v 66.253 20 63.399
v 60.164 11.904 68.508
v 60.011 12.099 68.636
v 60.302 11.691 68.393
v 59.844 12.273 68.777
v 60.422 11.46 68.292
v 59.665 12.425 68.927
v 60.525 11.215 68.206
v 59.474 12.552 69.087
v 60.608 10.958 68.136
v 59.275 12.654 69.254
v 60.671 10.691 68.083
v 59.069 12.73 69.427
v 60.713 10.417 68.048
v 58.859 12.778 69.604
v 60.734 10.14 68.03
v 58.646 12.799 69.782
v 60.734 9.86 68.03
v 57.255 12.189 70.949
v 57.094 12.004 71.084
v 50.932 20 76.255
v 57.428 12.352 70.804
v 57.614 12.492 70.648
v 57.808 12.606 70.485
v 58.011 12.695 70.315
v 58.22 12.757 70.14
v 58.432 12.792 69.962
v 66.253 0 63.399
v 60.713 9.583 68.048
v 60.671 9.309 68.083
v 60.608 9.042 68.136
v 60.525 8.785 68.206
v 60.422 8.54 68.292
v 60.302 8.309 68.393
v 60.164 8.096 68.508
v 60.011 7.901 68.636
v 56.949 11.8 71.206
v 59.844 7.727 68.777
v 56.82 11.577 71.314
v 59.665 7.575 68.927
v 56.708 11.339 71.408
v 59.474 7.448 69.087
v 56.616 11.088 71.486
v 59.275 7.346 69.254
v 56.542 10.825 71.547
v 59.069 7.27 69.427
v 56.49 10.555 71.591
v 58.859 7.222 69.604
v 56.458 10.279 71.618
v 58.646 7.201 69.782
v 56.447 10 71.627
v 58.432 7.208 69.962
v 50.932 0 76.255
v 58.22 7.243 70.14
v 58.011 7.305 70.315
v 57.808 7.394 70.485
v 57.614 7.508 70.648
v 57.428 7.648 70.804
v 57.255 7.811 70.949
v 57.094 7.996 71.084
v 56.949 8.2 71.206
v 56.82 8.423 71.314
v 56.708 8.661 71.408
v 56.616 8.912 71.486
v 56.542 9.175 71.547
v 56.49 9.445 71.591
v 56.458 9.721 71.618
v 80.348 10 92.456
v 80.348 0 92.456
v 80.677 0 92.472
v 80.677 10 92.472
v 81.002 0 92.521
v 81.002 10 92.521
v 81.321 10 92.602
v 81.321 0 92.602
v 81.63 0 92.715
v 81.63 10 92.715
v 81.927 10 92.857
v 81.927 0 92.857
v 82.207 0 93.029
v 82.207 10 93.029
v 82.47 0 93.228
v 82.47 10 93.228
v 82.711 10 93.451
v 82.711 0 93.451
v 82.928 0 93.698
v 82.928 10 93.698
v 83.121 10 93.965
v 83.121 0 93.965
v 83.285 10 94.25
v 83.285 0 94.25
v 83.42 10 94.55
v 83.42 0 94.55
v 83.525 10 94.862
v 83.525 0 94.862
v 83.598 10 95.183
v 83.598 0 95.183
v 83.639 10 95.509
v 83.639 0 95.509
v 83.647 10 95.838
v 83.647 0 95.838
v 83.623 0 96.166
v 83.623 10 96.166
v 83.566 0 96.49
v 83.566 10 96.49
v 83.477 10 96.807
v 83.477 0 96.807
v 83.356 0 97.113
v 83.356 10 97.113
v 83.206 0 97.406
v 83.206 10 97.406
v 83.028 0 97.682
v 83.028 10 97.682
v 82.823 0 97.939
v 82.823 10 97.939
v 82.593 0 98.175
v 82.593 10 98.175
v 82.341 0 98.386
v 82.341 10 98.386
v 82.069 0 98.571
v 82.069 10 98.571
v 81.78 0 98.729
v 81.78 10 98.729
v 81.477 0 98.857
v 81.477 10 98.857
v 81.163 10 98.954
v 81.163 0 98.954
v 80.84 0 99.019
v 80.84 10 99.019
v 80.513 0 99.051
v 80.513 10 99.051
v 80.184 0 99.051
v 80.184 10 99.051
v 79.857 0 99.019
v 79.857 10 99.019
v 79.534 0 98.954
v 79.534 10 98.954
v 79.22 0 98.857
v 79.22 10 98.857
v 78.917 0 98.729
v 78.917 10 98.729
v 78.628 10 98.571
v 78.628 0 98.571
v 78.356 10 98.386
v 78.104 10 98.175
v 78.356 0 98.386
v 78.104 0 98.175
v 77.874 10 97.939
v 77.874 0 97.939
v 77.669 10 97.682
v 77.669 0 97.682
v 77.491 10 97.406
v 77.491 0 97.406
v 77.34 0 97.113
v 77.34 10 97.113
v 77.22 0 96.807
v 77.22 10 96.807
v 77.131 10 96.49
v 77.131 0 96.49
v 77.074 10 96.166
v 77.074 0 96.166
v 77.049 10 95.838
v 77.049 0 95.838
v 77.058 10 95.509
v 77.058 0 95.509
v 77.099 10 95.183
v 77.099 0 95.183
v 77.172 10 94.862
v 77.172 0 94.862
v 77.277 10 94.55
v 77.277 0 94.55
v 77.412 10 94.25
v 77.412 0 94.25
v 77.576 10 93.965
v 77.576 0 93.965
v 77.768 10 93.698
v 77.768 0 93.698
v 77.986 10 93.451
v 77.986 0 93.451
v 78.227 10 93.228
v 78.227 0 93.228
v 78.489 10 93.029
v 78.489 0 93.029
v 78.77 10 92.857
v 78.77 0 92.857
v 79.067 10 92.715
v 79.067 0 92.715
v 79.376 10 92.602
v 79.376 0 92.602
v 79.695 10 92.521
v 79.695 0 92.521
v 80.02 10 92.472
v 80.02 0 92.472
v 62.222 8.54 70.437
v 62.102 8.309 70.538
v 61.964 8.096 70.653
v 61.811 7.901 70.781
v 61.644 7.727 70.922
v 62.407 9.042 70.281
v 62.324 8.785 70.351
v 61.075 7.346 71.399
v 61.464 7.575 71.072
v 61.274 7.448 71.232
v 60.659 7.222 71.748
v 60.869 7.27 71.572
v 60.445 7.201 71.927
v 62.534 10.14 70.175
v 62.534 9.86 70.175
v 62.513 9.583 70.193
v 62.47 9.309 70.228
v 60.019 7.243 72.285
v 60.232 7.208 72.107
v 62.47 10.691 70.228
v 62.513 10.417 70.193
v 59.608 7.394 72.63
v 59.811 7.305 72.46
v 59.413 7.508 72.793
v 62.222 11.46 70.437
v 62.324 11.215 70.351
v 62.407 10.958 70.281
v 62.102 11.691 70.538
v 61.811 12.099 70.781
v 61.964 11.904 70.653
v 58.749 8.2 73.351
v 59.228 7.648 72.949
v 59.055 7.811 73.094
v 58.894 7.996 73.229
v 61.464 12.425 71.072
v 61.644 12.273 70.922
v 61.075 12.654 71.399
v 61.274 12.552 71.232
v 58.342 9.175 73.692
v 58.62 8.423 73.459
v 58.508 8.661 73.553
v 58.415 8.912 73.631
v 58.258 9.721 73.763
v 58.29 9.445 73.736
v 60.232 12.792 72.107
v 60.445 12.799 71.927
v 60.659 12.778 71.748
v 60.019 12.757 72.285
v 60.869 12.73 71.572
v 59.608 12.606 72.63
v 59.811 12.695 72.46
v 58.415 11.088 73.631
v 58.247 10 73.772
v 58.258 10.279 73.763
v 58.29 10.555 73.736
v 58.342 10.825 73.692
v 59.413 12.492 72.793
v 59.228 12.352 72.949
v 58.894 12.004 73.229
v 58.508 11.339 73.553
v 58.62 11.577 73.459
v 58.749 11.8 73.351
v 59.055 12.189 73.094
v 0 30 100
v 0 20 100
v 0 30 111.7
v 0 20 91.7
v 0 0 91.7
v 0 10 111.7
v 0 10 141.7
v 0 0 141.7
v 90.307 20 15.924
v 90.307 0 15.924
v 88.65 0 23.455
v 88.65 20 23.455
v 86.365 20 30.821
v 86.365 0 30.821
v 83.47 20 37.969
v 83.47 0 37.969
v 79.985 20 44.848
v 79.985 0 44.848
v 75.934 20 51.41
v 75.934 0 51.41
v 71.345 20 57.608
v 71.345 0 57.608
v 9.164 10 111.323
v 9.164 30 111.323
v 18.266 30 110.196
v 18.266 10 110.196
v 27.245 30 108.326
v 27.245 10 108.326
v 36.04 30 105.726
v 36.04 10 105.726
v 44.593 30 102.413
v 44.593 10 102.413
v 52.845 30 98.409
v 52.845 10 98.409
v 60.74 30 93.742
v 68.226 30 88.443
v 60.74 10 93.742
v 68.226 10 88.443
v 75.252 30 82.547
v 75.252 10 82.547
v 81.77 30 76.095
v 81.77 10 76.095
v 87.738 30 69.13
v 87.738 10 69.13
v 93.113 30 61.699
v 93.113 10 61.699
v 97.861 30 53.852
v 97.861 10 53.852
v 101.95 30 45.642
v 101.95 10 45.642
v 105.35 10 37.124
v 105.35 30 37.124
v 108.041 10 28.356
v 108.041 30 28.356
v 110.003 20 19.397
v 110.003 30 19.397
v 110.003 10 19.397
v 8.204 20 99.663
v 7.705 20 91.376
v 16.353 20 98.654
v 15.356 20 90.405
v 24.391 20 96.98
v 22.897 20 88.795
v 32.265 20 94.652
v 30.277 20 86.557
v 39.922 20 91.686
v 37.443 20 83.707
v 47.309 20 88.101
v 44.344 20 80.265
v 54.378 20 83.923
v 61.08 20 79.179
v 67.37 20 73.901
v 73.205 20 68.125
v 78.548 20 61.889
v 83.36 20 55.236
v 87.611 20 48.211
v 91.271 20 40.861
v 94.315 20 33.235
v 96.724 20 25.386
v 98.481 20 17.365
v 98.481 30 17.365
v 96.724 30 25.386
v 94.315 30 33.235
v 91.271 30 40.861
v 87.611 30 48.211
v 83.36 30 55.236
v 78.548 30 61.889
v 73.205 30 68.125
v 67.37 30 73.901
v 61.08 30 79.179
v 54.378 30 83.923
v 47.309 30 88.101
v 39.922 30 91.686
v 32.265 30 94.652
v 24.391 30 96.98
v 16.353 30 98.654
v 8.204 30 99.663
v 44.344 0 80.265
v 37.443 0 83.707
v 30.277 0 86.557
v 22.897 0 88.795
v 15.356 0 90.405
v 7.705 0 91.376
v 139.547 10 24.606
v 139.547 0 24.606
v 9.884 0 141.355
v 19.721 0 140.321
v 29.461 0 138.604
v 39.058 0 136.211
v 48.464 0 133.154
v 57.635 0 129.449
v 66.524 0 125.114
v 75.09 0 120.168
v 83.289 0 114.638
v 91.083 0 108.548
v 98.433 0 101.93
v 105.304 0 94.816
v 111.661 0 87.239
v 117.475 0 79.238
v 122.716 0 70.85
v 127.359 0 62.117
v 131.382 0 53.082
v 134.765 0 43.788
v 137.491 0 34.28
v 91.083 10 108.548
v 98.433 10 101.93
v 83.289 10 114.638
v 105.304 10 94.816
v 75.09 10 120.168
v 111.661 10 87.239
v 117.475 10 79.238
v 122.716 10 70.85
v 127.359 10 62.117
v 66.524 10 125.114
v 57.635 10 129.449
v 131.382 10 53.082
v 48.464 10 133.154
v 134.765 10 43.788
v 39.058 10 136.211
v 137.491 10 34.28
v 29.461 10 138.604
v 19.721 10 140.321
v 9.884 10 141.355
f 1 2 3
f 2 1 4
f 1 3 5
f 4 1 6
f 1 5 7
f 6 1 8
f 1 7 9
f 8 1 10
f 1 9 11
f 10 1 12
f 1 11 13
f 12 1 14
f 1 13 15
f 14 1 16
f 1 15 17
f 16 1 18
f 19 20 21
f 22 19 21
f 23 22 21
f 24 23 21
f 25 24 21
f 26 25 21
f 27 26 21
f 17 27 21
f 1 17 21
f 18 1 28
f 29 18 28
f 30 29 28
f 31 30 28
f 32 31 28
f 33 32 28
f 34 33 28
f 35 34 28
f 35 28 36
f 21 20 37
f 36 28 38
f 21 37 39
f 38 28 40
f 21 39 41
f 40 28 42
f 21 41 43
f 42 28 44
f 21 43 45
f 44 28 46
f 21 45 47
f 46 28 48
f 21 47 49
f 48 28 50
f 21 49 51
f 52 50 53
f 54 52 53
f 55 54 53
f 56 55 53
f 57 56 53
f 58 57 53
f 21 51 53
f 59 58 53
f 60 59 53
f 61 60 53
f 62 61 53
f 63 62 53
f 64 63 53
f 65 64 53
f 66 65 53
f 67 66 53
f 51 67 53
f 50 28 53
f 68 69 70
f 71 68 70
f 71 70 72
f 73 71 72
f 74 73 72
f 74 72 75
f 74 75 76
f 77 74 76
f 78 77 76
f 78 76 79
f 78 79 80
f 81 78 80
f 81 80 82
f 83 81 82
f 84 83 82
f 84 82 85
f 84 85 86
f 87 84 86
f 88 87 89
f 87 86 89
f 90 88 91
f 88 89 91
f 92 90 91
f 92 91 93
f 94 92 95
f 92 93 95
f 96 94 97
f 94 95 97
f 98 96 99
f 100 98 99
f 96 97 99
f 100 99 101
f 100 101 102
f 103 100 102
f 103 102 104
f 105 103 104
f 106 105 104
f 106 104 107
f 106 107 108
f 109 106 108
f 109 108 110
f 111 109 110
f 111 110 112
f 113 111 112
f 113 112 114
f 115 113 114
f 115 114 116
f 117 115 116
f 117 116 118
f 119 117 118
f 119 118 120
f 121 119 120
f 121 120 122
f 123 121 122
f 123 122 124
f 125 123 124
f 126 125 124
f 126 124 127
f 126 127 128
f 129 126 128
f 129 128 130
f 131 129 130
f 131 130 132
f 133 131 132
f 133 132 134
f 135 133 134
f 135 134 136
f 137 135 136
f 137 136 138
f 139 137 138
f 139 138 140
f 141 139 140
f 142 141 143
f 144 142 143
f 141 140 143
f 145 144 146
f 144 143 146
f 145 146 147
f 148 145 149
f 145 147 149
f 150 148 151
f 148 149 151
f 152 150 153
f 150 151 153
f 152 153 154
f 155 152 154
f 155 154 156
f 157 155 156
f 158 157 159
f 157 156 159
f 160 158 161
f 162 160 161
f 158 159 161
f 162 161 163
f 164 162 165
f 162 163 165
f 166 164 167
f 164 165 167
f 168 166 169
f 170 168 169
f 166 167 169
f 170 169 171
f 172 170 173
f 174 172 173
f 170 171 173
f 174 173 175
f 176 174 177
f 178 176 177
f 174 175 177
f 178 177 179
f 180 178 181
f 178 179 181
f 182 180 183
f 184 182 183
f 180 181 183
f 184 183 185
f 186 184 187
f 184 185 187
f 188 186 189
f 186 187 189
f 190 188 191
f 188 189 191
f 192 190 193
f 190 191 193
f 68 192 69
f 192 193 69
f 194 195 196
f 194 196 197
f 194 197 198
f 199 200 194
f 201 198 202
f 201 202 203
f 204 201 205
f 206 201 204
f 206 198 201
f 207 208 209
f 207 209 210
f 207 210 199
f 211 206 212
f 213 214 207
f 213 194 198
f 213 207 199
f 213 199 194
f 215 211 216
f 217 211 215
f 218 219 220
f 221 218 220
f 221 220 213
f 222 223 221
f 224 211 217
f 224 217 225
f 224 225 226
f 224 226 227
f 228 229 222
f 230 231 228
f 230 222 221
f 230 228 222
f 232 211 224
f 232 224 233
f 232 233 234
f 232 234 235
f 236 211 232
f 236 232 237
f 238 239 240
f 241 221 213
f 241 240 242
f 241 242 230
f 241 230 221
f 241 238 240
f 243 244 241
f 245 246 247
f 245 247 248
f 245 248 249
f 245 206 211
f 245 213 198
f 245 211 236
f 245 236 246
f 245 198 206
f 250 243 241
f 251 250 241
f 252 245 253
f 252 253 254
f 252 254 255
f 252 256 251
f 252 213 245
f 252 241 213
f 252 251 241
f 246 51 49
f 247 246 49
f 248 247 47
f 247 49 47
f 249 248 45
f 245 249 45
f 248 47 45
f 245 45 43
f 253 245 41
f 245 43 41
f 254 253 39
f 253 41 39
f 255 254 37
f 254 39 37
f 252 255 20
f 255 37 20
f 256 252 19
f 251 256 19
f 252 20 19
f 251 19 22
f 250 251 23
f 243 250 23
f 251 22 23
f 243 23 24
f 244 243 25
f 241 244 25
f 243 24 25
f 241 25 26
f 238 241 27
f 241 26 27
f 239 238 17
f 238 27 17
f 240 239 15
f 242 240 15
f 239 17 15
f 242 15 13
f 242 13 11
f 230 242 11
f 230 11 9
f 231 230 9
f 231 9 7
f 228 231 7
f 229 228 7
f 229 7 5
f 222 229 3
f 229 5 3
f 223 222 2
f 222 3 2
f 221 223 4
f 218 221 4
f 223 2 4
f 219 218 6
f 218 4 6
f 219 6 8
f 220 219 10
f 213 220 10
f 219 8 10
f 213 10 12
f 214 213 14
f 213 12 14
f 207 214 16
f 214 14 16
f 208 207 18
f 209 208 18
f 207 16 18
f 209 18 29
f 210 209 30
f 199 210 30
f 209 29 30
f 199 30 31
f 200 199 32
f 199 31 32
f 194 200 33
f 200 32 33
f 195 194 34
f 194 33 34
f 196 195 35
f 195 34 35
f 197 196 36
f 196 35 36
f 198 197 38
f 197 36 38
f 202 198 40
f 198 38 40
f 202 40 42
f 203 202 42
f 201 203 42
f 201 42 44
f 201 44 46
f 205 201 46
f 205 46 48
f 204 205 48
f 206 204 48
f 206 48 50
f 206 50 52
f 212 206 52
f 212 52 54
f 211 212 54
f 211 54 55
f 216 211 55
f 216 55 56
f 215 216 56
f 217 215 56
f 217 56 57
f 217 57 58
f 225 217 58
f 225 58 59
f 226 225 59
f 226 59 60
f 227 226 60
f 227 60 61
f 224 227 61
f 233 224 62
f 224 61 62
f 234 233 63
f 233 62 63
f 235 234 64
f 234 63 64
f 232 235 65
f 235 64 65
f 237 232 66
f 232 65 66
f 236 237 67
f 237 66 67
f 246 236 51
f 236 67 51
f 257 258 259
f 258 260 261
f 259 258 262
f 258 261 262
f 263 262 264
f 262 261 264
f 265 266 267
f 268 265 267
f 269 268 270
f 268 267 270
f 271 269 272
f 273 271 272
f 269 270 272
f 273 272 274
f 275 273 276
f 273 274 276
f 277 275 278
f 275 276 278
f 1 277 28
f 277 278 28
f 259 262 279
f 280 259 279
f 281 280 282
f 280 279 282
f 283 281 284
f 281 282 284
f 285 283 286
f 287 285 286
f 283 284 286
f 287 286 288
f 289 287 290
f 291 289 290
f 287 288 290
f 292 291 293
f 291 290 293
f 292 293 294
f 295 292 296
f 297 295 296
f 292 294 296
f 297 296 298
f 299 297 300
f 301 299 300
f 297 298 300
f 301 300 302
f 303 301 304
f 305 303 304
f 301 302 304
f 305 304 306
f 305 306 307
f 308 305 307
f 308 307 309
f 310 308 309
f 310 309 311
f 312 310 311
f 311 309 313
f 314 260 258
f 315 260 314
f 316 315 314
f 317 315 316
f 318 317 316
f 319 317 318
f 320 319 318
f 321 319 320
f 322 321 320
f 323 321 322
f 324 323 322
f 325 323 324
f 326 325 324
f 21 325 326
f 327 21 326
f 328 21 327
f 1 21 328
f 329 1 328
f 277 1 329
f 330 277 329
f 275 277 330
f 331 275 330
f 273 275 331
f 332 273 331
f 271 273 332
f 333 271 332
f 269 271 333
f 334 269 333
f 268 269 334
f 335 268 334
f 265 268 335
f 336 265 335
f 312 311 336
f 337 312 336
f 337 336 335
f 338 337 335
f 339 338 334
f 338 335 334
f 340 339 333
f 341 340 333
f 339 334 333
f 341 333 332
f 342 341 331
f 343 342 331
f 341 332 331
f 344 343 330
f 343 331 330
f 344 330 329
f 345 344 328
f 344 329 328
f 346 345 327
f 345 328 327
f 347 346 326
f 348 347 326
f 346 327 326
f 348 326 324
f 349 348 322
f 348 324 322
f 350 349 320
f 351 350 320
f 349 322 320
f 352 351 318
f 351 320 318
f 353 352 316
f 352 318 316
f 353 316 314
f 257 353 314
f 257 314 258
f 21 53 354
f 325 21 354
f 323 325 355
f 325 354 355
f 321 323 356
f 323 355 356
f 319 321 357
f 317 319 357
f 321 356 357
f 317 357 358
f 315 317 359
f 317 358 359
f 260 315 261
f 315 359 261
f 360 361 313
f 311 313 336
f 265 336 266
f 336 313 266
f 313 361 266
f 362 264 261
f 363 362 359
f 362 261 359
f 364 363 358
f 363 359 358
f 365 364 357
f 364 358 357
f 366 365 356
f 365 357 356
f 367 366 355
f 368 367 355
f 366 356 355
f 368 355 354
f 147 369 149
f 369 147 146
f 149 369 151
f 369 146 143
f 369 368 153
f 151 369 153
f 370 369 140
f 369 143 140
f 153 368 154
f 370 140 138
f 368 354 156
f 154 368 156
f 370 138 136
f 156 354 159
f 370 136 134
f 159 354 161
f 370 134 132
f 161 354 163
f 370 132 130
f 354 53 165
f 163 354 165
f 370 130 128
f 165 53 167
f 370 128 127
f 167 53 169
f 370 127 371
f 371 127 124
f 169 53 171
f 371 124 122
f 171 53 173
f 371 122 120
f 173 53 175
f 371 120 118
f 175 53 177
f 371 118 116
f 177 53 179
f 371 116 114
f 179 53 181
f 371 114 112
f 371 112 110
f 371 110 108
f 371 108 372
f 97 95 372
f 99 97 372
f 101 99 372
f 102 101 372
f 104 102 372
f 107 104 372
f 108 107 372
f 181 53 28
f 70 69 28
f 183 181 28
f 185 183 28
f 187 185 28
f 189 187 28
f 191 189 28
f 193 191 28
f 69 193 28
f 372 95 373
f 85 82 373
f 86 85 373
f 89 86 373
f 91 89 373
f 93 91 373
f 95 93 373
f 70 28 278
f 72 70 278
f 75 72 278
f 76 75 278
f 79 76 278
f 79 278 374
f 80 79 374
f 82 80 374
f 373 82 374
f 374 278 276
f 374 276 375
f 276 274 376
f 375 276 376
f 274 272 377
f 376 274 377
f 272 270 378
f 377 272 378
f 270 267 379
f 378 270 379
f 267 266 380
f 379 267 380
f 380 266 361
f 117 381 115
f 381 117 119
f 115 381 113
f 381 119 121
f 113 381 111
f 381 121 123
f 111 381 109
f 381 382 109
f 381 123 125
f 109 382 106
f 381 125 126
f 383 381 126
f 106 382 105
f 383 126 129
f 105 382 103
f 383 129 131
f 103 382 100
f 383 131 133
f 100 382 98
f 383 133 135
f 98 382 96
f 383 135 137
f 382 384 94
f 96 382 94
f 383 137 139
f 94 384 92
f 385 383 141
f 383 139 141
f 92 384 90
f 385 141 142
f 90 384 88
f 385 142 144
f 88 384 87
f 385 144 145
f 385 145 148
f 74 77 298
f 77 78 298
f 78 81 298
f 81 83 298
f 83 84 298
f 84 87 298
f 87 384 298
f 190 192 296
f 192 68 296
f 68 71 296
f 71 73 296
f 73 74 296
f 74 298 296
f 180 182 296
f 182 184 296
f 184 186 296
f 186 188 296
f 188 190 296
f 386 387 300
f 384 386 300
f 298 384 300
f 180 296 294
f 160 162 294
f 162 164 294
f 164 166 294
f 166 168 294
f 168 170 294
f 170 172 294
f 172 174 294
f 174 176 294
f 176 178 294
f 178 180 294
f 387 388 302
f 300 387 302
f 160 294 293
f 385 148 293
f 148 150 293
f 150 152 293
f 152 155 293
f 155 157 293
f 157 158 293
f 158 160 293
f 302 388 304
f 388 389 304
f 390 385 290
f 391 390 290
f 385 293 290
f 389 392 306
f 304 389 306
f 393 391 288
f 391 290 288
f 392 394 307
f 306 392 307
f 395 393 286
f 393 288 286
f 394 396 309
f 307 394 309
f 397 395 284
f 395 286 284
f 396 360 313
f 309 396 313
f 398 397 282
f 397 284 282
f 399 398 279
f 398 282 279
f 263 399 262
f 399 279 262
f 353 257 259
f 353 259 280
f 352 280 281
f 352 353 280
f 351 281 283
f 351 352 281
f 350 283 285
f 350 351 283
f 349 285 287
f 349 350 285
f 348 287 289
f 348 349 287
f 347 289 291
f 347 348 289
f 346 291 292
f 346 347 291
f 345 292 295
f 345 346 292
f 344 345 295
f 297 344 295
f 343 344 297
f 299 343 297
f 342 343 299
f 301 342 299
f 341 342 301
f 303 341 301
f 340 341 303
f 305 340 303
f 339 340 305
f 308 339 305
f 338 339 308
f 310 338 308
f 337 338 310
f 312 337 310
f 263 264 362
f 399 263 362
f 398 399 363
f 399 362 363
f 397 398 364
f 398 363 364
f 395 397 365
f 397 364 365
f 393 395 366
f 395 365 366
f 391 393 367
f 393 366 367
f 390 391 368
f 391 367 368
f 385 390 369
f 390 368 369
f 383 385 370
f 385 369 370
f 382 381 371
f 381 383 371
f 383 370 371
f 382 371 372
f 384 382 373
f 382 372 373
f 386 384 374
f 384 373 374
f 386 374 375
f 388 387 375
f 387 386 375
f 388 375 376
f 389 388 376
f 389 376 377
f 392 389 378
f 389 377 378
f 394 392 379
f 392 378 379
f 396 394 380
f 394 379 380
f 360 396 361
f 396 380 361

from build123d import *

# Parameters (mm, degrees)
ESTRUSIONE_ESTRUSIONE1_DEPTH = 20
ESTRUSIONE_ESTRUSIONE2_DEPTH = 10
SCHIZZO4_R                   = 2.8
TAGLIO_ESTRUSIONE2_DEPTH     = 2.8
TAGLIO_ESTRUSIONE3_START     = -20
TAGLIO_ESTRUSIONE3_DEPTH     = 20
FORO_PER_VITE_M6_1_D         = 6.6


with BuildPart() as part:
    # Schizzo1 → Estrusione-Estrusione1 (new body)
    with BuildSketch(Plane(origin=(0, 0, 0), x_dir=(1, 0, 0), z_dir=(0, 1, 0))):
        with BuildLine():
            Line((0, -91.7), (0, -141.7))
            ThreePointArc((0, -141.7), (91.083004293, -108.54849759), (139.547258602, -24.605946775))
            Line((139.547258602, -24.605946775), (90.306870951, -15.923537892))
            ThreePointArc((90.306870951, -15.923537892), (81.799772383, -41.444990506), (66.252536018, -63.399459549))
            Line((66.252536018, -63.399459549), (50.931647156, -76.255211743))
            ThreePointArc((50.931647156, -76.255211743), (26.610966566, -87.753897112), (0, -91.7))
        make_face()
    extrude(amount=ESTRUSIONE_ESTRUSIONE1_DEPTH)

    # Schizzo2 → Estrusione-Estrusione2 (add)
    with BuildSketch(Plane(origin=(0, 20, 0), x_dir=(1, 0, 0), z_dir=(0, 1, 0))):
        with BuildLine():
            Line((0, -100), (0, -141.7))
            ThreePointArc((0, -141.7), (91.083004293, -108.54849759), (139.547258602, -24.605946775))
            Line((139.547258602, -24.605946775), (98.480775301, -17.364817767))
            ThreePointArc((98.480775301, -17.364817767), (64.278760969, -76.604444312), (0, -100))
        make_face()
    extrude(amount=ESTRUSIONE_ESTRUSIONE2_DEPTH)

    # Schizzo4 → Taglio-Estrusione2 (cut)
    with BuildSketch(Plane(origin=(58.592091587, 0, 69.827335646), x_dir=(-0.7660444431189816, 0, 0.6427876096865353), z_dir=(-0.6427876096865353, 0, -0.7660444431189817))):
        with Locations((0, 10)):
            Circle(SCHIZZO4_R)
    extrude(amount=-TAGLIO_ESTRUSIONE2_DEPTH, mode=Mode.SUBTRACT)

    # Schizzo5 → Taglio-Estrusione3 (cut)
    with BuildSketch(Plane(origin=(0, 30, 0), x_dir=(1, 0, 0), z_dir=(0, 1, 0)).offset(TAGLIO_ESTRUSIONE3_START)):
        with BuildLine():
            Line((0, -141.7), (0, -111.7))
            ThreePointArc((0, -111.7), (71.799376002, -85.567164296), (110.003026011, -19.396501445))
            Line((110.003026011, -19.396501445), (139.547258602, -24.605946775))
            ThreePointArc((139.547258602, -24.605946775), (91.083004293, -108.54849759), (0, -141.7))
        make_face()
    extrude(amount=TAGLIO_ESTRUSIONE3_DEPTH, mode=Mode.SUBTRACT)

    # Foro per Vite M6-1 (through all)
    with Locations(Plane(origin=(80.348451211, 10, 95.75555539), x_dir=(0, 0, 1), z_dir=(0, 1, 0))):
        with Locations((0, 0)):
            Hole(FORO_PER_VITE_M6_1_D / 2)


solid = part.part
